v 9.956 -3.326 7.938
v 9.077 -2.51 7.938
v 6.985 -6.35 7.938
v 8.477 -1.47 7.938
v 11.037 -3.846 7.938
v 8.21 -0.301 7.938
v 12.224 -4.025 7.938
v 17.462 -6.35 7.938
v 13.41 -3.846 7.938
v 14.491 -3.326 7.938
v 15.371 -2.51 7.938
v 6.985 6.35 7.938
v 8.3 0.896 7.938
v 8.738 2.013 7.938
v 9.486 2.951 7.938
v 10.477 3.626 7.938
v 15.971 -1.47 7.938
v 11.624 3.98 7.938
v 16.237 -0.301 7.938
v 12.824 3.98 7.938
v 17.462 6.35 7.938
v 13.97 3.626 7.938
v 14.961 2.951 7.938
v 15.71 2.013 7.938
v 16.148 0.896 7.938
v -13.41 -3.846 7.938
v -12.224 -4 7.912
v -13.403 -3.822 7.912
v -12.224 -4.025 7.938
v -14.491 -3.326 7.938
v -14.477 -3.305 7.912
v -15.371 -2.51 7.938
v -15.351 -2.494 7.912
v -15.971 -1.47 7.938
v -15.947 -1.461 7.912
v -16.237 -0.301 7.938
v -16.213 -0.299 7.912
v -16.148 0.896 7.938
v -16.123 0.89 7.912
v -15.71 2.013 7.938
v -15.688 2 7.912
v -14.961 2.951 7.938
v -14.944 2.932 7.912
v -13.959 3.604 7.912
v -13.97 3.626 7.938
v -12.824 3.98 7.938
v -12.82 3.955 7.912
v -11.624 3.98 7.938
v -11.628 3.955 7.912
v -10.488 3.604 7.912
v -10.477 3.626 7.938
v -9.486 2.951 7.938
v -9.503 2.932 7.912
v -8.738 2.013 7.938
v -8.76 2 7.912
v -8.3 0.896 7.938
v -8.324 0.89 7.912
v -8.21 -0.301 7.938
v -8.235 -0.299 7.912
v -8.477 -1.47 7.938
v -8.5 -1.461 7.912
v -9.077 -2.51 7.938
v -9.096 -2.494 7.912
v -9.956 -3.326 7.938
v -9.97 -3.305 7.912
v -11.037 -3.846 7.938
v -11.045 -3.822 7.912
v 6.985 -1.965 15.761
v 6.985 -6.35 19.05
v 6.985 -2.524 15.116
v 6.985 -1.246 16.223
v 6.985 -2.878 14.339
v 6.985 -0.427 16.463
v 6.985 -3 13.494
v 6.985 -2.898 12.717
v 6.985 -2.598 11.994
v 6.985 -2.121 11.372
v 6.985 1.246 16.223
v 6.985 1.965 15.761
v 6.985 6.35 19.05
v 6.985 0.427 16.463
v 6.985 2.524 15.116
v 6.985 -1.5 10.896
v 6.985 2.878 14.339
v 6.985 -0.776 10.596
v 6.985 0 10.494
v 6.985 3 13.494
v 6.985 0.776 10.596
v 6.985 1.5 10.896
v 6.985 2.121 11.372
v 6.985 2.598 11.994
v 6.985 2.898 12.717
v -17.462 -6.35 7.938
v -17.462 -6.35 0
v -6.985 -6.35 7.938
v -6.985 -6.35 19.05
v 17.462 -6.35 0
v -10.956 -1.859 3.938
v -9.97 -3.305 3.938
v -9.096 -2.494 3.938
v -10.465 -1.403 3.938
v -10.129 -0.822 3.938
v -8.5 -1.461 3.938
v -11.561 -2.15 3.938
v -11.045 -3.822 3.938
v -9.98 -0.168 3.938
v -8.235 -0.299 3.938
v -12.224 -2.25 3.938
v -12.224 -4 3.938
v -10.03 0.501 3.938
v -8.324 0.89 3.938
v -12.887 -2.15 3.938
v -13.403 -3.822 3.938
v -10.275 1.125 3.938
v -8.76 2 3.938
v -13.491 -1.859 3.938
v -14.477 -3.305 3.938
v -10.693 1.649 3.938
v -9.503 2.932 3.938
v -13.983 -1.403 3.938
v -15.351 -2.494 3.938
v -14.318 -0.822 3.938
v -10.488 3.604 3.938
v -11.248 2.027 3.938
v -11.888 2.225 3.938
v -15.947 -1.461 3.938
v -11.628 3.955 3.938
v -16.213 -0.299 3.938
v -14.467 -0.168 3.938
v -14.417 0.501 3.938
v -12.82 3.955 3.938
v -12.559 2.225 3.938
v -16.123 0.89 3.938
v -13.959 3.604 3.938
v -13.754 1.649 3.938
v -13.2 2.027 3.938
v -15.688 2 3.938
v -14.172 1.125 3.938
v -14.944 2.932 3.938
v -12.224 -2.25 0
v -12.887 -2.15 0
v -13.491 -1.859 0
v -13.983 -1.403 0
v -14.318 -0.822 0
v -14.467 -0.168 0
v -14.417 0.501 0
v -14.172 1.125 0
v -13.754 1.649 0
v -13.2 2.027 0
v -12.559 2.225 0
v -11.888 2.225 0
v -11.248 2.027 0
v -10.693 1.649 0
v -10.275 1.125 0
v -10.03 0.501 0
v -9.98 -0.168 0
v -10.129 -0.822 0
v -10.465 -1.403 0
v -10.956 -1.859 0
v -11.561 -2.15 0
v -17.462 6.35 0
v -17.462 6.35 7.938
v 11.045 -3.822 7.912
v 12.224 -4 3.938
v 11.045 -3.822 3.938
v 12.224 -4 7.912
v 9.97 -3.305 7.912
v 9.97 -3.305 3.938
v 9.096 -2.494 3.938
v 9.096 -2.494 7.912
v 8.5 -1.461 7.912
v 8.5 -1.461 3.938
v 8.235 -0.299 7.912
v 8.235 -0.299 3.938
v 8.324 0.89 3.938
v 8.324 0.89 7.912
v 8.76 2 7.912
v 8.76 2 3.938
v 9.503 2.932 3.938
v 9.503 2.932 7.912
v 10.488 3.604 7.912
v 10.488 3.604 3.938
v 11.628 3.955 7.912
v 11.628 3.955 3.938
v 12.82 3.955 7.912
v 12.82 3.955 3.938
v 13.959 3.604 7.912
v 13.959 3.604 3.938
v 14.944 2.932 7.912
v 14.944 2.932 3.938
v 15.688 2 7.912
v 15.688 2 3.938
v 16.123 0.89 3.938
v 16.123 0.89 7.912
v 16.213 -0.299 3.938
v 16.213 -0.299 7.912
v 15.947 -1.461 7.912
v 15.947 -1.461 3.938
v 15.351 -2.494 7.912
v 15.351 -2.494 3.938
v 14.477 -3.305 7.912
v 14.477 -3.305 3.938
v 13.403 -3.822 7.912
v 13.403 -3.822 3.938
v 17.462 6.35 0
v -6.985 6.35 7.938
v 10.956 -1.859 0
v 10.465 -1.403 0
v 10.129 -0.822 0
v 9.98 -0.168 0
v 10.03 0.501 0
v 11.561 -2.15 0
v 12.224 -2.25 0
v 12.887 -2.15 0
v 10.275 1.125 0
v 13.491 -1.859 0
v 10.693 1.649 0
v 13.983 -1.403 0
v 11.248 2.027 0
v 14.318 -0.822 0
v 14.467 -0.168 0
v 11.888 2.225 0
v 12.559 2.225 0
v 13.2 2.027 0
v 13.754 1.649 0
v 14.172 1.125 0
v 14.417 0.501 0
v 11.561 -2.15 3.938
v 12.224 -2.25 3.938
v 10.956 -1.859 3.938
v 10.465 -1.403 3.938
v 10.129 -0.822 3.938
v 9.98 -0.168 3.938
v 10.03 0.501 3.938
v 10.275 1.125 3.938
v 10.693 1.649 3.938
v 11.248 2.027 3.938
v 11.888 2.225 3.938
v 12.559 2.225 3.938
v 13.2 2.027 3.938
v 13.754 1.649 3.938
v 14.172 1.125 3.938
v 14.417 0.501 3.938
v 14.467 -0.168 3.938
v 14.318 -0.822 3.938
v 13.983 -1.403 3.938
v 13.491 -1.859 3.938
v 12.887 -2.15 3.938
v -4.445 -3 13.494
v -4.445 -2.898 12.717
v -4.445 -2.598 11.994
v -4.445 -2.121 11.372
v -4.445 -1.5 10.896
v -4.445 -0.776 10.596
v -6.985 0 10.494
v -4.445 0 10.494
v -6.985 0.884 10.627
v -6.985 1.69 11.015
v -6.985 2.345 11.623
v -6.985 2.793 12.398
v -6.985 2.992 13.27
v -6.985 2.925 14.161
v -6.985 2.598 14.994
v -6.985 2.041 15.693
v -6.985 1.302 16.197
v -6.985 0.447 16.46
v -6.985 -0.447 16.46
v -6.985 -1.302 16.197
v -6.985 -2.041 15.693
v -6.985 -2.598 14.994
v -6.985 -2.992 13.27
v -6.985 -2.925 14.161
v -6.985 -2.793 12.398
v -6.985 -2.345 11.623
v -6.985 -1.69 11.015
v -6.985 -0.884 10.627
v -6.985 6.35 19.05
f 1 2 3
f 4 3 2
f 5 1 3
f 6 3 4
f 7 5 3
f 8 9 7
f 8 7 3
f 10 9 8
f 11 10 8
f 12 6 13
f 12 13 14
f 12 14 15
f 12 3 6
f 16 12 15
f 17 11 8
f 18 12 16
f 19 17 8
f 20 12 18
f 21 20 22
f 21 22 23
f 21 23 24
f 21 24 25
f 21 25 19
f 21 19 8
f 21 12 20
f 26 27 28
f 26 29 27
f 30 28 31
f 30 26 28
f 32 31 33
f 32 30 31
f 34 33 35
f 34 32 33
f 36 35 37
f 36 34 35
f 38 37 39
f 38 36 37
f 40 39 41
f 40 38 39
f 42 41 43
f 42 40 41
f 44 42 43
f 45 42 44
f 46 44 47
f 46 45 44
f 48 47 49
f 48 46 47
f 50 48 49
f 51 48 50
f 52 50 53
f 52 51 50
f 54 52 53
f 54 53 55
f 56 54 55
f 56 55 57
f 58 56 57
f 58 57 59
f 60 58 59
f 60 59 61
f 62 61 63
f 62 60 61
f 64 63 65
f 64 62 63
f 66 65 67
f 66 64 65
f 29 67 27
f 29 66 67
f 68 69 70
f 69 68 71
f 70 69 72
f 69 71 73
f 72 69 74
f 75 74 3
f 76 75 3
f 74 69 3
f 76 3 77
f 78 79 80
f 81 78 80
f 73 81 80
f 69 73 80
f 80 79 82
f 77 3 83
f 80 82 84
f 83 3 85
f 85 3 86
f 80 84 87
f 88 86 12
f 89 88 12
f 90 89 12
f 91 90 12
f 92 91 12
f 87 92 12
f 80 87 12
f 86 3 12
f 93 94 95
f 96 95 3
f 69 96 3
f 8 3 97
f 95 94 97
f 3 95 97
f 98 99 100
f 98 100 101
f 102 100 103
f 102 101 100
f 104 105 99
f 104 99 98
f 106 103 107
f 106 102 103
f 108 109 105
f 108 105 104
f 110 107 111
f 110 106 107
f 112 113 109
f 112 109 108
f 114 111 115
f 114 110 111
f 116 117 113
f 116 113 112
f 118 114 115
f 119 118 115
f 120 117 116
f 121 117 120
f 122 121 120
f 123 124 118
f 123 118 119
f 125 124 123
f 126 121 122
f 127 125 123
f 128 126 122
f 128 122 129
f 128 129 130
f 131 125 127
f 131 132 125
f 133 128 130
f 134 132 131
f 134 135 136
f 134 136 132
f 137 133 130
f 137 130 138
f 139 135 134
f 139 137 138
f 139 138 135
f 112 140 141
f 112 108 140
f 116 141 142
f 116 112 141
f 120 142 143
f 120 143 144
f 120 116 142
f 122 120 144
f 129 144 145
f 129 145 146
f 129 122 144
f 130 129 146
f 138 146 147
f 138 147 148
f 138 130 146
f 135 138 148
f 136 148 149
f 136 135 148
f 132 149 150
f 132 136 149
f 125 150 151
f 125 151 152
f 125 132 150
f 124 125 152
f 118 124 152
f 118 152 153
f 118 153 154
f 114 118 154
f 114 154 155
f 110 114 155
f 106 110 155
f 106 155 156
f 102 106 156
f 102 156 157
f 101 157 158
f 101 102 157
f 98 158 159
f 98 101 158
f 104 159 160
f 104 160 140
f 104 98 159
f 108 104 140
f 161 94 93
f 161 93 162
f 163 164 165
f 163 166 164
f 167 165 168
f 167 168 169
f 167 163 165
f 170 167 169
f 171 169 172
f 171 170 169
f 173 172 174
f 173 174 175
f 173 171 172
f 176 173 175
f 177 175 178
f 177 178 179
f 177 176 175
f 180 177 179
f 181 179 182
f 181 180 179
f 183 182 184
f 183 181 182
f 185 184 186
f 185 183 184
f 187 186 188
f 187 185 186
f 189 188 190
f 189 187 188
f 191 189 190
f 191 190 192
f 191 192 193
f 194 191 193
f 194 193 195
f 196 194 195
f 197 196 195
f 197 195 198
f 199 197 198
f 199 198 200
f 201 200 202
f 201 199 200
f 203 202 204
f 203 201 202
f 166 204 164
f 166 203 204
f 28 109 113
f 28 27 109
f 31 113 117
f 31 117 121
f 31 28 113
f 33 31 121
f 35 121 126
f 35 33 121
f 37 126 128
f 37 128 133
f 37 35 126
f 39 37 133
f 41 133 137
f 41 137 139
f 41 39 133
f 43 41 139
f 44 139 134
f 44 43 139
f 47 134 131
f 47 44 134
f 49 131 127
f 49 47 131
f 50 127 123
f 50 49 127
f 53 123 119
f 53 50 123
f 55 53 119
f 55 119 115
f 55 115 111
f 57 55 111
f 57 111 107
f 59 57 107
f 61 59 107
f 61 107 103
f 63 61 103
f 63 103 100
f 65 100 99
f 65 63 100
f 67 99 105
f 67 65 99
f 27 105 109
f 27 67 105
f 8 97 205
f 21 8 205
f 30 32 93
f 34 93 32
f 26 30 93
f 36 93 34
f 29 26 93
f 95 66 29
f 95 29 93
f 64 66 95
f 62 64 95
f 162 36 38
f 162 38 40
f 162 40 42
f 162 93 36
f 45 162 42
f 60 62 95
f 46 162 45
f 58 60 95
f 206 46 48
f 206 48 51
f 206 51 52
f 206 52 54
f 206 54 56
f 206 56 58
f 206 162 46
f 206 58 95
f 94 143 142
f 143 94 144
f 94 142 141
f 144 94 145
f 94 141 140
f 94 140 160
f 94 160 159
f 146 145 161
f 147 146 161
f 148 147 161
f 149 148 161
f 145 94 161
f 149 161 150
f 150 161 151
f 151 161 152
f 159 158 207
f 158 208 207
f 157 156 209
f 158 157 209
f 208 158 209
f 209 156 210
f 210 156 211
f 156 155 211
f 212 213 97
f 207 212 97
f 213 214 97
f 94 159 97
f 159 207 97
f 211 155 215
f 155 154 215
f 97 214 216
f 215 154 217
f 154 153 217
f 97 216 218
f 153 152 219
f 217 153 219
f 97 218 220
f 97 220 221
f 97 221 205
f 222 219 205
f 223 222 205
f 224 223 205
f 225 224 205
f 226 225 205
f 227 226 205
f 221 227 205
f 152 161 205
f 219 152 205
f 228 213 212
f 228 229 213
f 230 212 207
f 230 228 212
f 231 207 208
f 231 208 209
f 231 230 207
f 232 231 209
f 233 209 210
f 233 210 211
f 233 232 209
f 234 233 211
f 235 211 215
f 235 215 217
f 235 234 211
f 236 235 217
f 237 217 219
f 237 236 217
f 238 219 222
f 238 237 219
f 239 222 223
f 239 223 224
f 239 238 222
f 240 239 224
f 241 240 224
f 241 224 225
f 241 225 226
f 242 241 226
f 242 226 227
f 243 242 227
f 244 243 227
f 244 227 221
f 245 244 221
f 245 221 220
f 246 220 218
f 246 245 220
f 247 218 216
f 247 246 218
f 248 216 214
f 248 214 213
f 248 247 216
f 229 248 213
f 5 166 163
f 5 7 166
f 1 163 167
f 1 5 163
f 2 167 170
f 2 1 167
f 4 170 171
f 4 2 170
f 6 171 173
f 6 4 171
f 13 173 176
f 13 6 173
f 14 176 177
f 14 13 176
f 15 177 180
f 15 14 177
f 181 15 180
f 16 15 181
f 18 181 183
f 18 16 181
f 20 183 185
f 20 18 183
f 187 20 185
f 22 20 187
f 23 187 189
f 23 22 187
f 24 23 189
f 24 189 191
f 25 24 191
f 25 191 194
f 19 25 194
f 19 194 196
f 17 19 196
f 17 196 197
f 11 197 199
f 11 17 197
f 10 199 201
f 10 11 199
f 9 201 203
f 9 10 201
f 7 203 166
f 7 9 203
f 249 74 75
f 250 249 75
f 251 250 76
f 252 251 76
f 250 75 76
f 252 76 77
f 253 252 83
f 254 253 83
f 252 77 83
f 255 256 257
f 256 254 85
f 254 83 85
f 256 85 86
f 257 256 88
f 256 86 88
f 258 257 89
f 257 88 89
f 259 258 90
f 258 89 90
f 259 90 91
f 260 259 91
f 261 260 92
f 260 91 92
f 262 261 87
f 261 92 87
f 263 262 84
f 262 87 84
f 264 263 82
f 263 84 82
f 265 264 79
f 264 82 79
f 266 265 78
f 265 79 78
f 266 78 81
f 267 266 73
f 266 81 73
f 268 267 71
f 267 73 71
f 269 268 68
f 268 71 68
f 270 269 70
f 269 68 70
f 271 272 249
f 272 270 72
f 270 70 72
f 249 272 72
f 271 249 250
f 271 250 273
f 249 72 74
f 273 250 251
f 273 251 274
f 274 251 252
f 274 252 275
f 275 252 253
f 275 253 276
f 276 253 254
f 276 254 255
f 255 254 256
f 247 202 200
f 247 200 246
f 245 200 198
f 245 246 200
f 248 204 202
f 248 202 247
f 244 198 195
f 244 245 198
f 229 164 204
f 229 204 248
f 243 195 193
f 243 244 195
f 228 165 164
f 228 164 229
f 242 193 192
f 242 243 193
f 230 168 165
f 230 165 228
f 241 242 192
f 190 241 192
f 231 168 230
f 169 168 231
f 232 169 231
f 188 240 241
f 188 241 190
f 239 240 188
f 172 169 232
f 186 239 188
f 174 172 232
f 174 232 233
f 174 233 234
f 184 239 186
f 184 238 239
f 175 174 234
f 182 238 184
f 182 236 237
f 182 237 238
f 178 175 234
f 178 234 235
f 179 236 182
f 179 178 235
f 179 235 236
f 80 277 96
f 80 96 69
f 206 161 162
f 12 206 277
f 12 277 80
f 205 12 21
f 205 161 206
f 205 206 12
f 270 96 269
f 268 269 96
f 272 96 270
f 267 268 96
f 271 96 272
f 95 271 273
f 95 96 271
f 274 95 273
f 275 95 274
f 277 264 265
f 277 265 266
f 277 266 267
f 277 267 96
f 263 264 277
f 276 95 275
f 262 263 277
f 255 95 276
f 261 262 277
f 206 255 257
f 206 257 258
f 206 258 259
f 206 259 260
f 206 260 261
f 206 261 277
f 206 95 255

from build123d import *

# Parameters (mm, degrees)
SKETCH1_W                     = 10.4775
SKETCH1_H                     = 12.7
SKETCH1_R                     = 2
SKETCH1_W_2                   = 13.97
BOSS_EXTRUDE1_DEPTH           = 7.9375
SKETCH2_W                     = 13.97
SKETCH2_H                     = 12.7
BOSS_EXTRUDE2_DEPTH           = 11.1125
CUT_EXTRUDE1_DEPTH            = 11.43
SKETCH4_R                     = 1.143
CUT_EXTRUDE2_DEPTH            = 32.637086722
CBORE_FOR_M4_SHCS1_AT_2_COUNT = 2
CBORE_FOR_M4_SHCS1_AT_2_PITCH = 24.4475
SKETCH8_R                     = 3
SKETCH8_R_2                   = 1.143
CUT_EXTRUDE3_DEPTH            = 32.637086722


with BuildPart() as part:
    # Sketch1 → Boss-Extrude1 (new body)
    # profile 1 of 5: a face of its own
    with BuildSketch(Plane.XY):
        with Locations((12.22375, 0)):
            Rectangle(SKETCH1_W, SKETCH1_H)
        with Locations((12.22375, 0)):
            Circle(SKETCH1_R, mode=Mode.SUBTRACT)
    # profile 2 of 5: a face of its own
    with BuildSketch(Plane.XY):
        Rectangle(SKETCH1_W_2, SKETCH1_H)
    # profile 3 of 5: a face of its own
    with BuildSketch(Plane.XY):
        with Locations((-12.22375, 0)):
            Rectangle(SKETCH1_W, SKETCH1_H)
        with Locations((-12.22375, 0)):
            Circle(SKETCH1_R, mode=Mode.SUBTRACT)
    # profile 4 of 5: a face of its own
    with BuildSketch(Plane.XY):
        with Locations((12.22375, 0)):
            Circle(SKETCH1_R)
    # profile 5 of 5: a face of its own
    with BuildSketch(Plane.XY):
        with Locations((-12.22375, 0)):
            Circle(SKETCH1_R)
    extrude(amount=BOSS_EXTRUDE1_DEPTH)

    # Sketch2 → Boss-Extrude2 (add)
    with BuildSketch(Plane.XY.offset(7.9375)):
        Rectangle(SKETCH2_W, SKETCH2_H)
    extrude(amount=BOSS_EXTRUDE2_DEPTH)

    # Sketch3 → Cut-Extrude1 (cut)
    with BuildSketch(Plane(origin=(6.985, 0, 0), x_dir=(0, 0, -1), z_dir=(1, 0, 0))):
        with BuildLine():
            ThreePointArc((-13.49375, 3), (-16.49375, 0), (-13.49375, -3))
            Line((-13.49375, -3), (-13.49375, -1.143))
            ThreePointArc((-13.49375, -1.143), (-14.63675, 0), (-13.49375, 1.143))
            Line((-13.49375, 1.143), (-13.49375, 3))
        make_face()
        with BuildLine():
            Line((-13.49375, -1.143), (-13.49375, -3))
            ThreePointArc((-13.49375, -3), (-11.372429656, -2.121320344), (-10.49375, 0))
            ThreePointArc((-10.49375, 0), (-11.372429656, 2.121320344), (-13.49375, 3))
            Line((-13.49375, 3), (-13.49375, 1.143))
            ThreePointArc((-13.49375, 1.143), (-12.685526949, 0.808223051), (-12.35075, 0))
            ThreePointArc((-12.35075, 0), (-12.685526949, -0.808223051), (-13.49375, -1.143))
        make_face()
        with BuildLine():
            ThreePointArc((-13.49375, 1.143), (-14.63675, 0), (-13.49375, -1.143))
            Line((-13.49375, -1.143), (-13.49375, 1.143))
        make_face()
        with BuildLine():
            Line((-13.49375, 1.143), (-13.49375, -1.143))
            ThreePointArc((-13.49375, -1.143), (-12.685526949, -0.808223051), (-12.35075, 0))
            ThreePointArc((-12.35075, 0), (-12.685526949, 0.808223051), (-13.49375, 1.143))
        make_face()
    extrude(amount=-CUT_EXTRUDE1_DEPTH, mode=Mode.SUBTRACT)

    # Sketch4 → Cut-Extrude2 (cut, through all)
    with BuildSketch(Plane(origin=(6.985, 0, 0), x_dir=(0, 0, -1), z_dir=(1, 0, 0))):
        with Locations((-13.49375, 0)):
            Circle(SKETCH4_R)
    extrude(amount=-CUT_EXTRUDE2_DEPTH, mode=Mode.SUBTRACT)

    # Sketch6 → CBORE for M4 SHCS1 (revolve, cut)
    with BuildSketch(Plane(origin=(12.22375, 0, 7.9375), x_dir=(0, -1, 0), z_dir=(1, 0, 0))):
        Polygon((0, 0), (0, 7.9375), (2.25, 7.9375), (2.25, 4), (4, 4), (4, 0.025), (4.025, 0), align=None)
    cbore_for_m4_shcs1 = revolve(axis=Axis((12.22375, 0, 14.2875), (0, 0, -1)), mode=Mode.SUBTRACT)

    # CBORE for M4 SHCS1 at 2: CBORE for M4 SHCS1 ×2
    with Locations(*[(-i * CBORE_FOR_M4_SHCS1_AT_2_PITCH, 0, 0) for i in range(1, CBORE_FOR_M4_SHCS1_AT_2_COUNT)]):
        add(cbore_for_m4_shcs1, mode=Mode.SUBTRACT)

    # Sketch8 → Cut-Extrude3 (cut, through all)
    # profile 1 of 2: a face of its own
    with BuildSketch(Plane(origin=(6.985, 0, 0), x_dir=(0, 0, -1), z_dir=(1, 0, 0))):
        with Locations((-13.49375, 0)):
            Circle(SKETCH8_R)
        with Locations((-13.49375, 0)):
            Circle(SKETCH8_R_2, mode=Mode.SUBTRACT)
    # profile 2 of 2: a face of its own
    with BuildSketch(Plane(origin=(6.985, 0, 0), x_dir=(0, 0, -1), z_dir=(1, 0, 0))):
        with Locations((-13.49375, 0)):
            Circle(SKETCH8_R_2)
    extrude(amount=-CUT_EXTRUDE3_DEPTH, mode=Mode.SUBTRACT)


solid = part.part
